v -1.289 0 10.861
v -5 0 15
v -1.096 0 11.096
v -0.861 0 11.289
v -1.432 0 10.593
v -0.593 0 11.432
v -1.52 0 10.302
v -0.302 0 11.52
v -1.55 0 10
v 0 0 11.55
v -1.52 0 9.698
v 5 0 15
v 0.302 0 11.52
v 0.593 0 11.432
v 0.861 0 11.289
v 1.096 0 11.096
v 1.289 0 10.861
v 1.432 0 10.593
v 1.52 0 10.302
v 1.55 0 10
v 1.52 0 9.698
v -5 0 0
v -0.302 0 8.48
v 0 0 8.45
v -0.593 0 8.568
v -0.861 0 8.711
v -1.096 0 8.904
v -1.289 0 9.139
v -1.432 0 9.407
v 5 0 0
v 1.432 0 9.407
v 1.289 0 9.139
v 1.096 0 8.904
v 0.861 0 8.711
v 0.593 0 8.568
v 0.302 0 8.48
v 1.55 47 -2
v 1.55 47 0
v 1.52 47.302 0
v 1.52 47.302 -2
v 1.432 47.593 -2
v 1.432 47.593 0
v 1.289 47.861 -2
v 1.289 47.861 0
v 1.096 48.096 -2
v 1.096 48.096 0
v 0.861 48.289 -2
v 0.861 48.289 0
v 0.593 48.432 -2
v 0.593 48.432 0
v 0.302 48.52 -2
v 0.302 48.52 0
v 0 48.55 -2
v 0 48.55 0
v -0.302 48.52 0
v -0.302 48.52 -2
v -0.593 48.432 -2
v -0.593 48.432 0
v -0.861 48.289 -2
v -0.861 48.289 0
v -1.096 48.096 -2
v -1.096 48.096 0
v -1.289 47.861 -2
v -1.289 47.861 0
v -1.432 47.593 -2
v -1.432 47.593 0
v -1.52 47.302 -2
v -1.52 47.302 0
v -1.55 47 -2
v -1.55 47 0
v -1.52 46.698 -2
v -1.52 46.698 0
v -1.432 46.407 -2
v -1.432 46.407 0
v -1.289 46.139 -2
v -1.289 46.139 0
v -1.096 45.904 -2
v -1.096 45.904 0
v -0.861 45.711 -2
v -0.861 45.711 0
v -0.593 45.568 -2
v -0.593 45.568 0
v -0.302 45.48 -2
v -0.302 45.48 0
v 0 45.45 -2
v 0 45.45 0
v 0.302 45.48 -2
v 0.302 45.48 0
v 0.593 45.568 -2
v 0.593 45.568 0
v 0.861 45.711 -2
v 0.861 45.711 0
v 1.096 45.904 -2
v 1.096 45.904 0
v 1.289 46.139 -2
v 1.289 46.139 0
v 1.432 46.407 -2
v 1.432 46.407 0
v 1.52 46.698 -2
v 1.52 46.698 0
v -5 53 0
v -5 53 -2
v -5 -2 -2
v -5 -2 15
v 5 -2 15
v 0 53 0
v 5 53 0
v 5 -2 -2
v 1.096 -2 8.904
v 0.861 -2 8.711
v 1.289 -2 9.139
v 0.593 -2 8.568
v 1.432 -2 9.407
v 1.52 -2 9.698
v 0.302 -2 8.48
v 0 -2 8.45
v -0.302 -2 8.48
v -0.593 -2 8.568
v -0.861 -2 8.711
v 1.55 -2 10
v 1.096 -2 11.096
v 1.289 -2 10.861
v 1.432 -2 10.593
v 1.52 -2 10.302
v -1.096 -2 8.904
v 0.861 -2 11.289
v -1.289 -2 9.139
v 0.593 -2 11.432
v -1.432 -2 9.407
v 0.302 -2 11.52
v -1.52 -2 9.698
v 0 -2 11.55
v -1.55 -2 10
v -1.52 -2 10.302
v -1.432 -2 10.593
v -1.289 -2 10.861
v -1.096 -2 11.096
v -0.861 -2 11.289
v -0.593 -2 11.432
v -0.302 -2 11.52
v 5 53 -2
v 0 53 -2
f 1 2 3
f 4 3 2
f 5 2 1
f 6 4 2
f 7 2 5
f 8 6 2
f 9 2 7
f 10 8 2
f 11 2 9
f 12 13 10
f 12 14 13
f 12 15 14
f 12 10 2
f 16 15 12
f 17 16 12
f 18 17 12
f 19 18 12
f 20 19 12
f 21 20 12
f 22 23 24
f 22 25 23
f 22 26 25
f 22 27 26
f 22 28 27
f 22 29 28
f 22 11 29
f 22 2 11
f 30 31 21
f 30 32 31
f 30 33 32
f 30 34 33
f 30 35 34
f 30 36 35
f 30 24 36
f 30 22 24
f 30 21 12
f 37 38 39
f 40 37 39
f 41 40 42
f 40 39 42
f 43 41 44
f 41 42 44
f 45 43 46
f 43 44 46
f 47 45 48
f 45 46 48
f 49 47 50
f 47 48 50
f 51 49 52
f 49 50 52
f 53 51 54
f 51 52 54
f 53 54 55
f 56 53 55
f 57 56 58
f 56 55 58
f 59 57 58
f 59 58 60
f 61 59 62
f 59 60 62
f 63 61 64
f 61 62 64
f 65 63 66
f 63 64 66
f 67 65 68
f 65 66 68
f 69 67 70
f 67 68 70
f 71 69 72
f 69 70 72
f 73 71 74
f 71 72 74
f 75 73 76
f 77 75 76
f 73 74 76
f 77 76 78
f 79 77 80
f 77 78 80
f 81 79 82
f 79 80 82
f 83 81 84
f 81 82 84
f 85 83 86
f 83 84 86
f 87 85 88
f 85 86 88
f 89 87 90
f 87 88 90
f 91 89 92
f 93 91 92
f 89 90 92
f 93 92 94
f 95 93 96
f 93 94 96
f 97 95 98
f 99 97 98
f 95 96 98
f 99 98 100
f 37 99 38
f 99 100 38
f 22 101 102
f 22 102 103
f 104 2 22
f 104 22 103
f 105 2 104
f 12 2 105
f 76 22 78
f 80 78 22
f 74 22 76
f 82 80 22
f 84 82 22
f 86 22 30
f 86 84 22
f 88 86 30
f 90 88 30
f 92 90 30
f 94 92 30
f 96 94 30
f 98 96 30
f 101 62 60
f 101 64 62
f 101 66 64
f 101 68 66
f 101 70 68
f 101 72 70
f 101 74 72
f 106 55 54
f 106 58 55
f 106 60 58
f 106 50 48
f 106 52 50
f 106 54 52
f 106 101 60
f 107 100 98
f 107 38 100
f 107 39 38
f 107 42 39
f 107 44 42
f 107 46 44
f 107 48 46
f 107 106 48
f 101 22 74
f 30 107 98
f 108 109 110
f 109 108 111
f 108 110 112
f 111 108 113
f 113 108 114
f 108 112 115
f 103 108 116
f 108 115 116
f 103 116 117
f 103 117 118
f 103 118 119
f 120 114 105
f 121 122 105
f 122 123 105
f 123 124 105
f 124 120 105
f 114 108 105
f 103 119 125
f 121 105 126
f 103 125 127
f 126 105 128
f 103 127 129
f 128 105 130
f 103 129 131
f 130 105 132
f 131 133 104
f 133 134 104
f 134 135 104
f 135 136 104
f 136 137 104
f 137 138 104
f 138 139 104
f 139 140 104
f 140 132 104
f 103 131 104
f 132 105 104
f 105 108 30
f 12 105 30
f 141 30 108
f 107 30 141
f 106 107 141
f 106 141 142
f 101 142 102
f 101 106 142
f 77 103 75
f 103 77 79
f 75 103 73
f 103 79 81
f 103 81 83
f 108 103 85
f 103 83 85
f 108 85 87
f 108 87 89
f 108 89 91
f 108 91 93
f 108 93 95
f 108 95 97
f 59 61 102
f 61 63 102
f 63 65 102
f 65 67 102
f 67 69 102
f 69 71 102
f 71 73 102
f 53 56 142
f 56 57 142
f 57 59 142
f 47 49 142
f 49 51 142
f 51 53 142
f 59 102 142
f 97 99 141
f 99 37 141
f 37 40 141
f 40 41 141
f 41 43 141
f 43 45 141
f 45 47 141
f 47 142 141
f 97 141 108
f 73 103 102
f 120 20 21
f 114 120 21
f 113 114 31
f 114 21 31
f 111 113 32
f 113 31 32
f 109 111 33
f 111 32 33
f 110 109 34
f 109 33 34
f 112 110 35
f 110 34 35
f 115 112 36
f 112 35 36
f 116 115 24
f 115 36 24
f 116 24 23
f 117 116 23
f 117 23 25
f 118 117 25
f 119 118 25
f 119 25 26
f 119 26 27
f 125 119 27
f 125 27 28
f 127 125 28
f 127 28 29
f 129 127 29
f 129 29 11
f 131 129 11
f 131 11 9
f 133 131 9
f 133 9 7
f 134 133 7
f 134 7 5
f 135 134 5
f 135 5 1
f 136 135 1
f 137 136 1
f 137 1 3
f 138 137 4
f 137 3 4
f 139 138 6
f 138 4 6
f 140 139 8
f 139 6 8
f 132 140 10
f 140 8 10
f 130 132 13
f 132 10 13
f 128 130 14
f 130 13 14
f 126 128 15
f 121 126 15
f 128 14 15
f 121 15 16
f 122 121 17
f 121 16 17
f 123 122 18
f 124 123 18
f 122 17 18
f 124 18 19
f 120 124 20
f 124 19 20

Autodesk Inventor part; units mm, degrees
ref_plane "YZ Plane" through (0, 0, 0) normal (1, 0, 0) x (0, 1, 0)
ref_plane "XZ Plane" through (0, 0, 0) normal (0, 1, 0) x (-1, 0, 0)
ref_plane "XY Plane" through (0, 0, 0) normal (0, 0, 1) x (1, 0, 0)
sketch "Sketch1" plane through (0, 0, 0) normal (0, 0, 1) x (1, 0, 0)
  line L0 (5, -2) -> (-5, -2)
  line L1 (5, -2) -> (5, 53)
  line L2 (5, 53) -> (-5, 53)
  line L3 (-5, 53) -> (-5, -2)
  line L4 (0, 53) -> (0, 47)
  circle A0 centre (0, 47) radius 1.55
  point P0 (0, 0)
  dimension "d3" = 2
  dimension "d16" = 55
  dimension "d17" = 10
  dimension "d18" = 6
  dimension "d19" = 3.1
extrude "Extrusion1" add sketch "Sketch1" against normal blind 2
sketch "Sketch2" plane through (0, 0, 0) normal (0, 0, 1) x (1, 0, 0)
  line L0 (-5, 0) -> (5, 0)
  line L1 (5, 0) -> (5, -2)
  line L2 (5, -2) -> (-5, -2)
  line L3 (-5, -2) -> (-5, 0)
  point P0 (0, 0)
extrude "Extrusion2" add sketch "Sketch2" along normal blind 15
sketch "Sketch3" plane through (-5, 0, 0) normal (0, 1, 0) x (1, 0, 0)
  circle A0 centre (5, -10) radius 1.55
  line L0 (10, -15) -> (0, -15) projected
  point P0 (5, 0)
  dimension "d11" = 3.1
  dimension "d15" = 5
extrude "Extrusion3" cut sketch "Sketch3" against normal blind 2
properties part number "spacer tutup"
